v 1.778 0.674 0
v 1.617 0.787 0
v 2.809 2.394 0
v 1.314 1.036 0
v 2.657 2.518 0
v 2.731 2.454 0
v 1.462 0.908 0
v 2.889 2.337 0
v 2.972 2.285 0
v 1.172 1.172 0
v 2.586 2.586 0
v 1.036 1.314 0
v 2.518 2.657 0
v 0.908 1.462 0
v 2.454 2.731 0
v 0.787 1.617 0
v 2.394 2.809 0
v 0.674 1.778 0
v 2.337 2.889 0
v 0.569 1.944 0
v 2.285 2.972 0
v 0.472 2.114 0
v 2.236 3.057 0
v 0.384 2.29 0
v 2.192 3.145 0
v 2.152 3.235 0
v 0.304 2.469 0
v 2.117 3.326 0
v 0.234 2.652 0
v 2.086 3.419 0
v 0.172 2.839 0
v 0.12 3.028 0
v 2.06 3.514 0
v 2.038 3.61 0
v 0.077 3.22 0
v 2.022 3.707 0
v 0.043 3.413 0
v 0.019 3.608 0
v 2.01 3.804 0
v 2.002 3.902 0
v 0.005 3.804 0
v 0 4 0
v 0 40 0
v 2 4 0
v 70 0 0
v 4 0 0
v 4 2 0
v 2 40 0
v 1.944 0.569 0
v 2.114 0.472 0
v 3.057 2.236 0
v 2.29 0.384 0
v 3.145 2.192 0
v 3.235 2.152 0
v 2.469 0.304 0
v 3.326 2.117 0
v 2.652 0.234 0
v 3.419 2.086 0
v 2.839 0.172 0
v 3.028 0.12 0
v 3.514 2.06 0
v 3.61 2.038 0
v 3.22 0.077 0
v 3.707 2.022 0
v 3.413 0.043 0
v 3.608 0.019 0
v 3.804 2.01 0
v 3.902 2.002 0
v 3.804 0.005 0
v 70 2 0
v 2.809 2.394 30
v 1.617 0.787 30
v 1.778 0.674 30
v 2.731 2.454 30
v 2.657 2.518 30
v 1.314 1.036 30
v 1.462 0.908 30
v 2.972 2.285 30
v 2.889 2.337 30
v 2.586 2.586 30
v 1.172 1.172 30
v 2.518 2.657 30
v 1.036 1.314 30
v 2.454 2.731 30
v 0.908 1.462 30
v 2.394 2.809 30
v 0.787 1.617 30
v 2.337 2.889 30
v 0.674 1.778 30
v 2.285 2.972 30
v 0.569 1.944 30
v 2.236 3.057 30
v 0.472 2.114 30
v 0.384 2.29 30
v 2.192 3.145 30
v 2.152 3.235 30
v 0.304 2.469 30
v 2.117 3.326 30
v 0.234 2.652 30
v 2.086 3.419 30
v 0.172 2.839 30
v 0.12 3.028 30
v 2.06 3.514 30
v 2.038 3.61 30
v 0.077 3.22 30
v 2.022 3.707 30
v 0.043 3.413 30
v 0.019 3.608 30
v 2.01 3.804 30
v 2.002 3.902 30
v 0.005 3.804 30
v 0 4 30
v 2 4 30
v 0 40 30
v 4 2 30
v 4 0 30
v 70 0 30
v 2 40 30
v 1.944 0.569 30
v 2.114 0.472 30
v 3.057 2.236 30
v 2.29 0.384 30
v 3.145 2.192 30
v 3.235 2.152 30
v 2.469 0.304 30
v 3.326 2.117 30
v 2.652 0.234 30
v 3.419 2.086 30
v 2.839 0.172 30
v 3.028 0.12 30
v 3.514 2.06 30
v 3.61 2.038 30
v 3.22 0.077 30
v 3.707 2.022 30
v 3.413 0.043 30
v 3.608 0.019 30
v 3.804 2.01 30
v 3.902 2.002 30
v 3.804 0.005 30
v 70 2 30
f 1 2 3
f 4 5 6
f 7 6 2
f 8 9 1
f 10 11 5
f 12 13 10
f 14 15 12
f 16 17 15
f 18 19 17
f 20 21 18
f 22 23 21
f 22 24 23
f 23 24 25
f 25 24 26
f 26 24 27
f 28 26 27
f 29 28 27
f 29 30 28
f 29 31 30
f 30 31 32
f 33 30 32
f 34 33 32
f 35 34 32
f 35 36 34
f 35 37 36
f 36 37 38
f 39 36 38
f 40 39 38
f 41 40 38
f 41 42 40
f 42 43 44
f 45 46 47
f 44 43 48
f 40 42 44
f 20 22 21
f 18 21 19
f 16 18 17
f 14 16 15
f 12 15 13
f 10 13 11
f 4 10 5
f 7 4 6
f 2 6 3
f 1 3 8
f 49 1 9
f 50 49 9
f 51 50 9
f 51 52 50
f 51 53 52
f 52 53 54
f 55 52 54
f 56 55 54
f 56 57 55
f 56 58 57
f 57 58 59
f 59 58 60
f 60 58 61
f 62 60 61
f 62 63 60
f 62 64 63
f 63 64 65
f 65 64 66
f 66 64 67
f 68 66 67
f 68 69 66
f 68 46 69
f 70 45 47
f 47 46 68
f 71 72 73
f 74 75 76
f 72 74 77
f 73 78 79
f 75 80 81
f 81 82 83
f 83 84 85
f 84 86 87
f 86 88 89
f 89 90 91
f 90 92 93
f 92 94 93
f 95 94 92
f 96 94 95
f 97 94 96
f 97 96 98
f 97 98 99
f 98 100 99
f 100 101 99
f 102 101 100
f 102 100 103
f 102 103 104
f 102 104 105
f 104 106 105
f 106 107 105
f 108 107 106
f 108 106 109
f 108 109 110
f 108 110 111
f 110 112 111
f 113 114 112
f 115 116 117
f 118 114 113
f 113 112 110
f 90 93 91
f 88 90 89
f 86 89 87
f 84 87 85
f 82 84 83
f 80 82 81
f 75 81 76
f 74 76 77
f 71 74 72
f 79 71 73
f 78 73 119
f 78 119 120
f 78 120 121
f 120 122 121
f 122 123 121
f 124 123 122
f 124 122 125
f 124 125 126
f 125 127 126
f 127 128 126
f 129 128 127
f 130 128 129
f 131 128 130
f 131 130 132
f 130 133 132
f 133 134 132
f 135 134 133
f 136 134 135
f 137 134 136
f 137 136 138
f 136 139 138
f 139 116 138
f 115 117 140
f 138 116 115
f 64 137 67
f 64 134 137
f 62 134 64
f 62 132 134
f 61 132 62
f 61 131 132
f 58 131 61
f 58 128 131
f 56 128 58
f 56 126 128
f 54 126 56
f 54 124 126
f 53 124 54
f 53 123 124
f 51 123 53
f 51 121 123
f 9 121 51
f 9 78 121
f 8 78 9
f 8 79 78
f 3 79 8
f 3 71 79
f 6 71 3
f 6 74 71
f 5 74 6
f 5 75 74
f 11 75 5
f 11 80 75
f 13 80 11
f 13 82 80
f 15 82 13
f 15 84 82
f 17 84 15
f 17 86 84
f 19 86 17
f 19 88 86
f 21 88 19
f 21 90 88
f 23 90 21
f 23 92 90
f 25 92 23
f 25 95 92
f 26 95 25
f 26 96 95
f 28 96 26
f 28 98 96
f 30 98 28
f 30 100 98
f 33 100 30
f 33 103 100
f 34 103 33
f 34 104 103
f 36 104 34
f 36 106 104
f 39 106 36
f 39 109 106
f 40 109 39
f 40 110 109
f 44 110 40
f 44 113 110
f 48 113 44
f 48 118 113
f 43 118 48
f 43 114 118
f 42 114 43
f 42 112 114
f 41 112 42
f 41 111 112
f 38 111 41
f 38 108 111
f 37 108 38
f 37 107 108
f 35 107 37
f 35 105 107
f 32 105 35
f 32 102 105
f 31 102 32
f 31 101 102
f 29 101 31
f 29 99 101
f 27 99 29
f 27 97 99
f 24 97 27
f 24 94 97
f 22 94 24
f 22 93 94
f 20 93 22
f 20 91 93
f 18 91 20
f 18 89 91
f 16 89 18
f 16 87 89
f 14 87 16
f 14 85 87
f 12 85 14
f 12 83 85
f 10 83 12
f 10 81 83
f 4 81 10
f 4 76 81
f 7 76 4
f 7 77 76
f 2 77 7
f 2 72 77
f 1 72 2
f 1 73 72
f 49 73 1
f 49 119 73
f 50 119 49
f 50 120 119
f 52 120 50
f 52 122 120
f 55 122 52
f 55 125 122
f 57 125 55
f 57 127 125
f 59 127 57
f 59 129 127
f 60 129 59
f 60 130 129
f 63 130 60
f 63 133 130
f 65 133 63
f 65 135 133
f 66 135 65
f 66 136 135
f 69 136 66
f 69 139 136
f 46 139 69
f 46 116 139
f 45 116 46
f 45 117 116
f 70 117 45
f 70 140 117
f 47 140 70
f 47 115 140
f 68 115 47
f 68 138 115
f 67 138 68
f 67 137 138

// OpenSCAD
$fn = 128;

thickness_mm = 2.0;
bend_radius_mm = 2.0;        // inside radius
k_factor = 0.45;

flange_a_outside_mm = 70.0;
flange_b_outside_mm = 40.0;
width_mm = 30.0;
bend_angle_deg = 90.0;

outside_radius_mm = bend_radius_mm + thickness_mm;
neutral_radius_mm = bend_radius_mm + k_factor * thickness_mm;
bend_allowance_mm = PI * neutral_radius_mm * bend_angle_deg / 180.0;
outside_setback_mm = tan(bend_angle_deg / 2.0) * outside_radius_mm;
flat_length_mm = flange_a_outside_mm + flange_b_outside_mm - 2.0 * outside_setback_mm + bend_allowance_mm;

echo(str(
    "MAKERBENCH-SHEETMETAL: {",
    "\"thickness_mm\": ", thickness_mm, ", ",
    "\"bend_radius_mm\": ", bend_radius_mm, ", ",
    "\"developed_flat_length_mm\": ", round(flat_length_mm * 1000) / 1000,
    "}"
));

module bend_sector_2d() {
    intersection() {
        difference() {
            translate([outside_radius_mm, outside_radius_mm])
                circle(r = outside_radius_mm);
            translate([outside_radius_mm, outside_radius_mm])
                circle(r = bend_radius_mm);
        }
        square([outside_radius_mm, outside_radius_mm], center = false);
    }
}

module bracket_profile_2d() {
    union() {
        translate([outside_radius_mm, 0])
            square([flange_a_outside_mm - outside_radius_mm, thickness_mm], center = false);

        translate([0, outside_radius_mm])
            square([thickness_mm, flange_b_outside_mm - outside_radius_mm], center = false);

        bend_sector_2d();
    }
}

linear_extrude(height = width_mm, center = false, convexity = 10)
    bracket_profile_2d();
